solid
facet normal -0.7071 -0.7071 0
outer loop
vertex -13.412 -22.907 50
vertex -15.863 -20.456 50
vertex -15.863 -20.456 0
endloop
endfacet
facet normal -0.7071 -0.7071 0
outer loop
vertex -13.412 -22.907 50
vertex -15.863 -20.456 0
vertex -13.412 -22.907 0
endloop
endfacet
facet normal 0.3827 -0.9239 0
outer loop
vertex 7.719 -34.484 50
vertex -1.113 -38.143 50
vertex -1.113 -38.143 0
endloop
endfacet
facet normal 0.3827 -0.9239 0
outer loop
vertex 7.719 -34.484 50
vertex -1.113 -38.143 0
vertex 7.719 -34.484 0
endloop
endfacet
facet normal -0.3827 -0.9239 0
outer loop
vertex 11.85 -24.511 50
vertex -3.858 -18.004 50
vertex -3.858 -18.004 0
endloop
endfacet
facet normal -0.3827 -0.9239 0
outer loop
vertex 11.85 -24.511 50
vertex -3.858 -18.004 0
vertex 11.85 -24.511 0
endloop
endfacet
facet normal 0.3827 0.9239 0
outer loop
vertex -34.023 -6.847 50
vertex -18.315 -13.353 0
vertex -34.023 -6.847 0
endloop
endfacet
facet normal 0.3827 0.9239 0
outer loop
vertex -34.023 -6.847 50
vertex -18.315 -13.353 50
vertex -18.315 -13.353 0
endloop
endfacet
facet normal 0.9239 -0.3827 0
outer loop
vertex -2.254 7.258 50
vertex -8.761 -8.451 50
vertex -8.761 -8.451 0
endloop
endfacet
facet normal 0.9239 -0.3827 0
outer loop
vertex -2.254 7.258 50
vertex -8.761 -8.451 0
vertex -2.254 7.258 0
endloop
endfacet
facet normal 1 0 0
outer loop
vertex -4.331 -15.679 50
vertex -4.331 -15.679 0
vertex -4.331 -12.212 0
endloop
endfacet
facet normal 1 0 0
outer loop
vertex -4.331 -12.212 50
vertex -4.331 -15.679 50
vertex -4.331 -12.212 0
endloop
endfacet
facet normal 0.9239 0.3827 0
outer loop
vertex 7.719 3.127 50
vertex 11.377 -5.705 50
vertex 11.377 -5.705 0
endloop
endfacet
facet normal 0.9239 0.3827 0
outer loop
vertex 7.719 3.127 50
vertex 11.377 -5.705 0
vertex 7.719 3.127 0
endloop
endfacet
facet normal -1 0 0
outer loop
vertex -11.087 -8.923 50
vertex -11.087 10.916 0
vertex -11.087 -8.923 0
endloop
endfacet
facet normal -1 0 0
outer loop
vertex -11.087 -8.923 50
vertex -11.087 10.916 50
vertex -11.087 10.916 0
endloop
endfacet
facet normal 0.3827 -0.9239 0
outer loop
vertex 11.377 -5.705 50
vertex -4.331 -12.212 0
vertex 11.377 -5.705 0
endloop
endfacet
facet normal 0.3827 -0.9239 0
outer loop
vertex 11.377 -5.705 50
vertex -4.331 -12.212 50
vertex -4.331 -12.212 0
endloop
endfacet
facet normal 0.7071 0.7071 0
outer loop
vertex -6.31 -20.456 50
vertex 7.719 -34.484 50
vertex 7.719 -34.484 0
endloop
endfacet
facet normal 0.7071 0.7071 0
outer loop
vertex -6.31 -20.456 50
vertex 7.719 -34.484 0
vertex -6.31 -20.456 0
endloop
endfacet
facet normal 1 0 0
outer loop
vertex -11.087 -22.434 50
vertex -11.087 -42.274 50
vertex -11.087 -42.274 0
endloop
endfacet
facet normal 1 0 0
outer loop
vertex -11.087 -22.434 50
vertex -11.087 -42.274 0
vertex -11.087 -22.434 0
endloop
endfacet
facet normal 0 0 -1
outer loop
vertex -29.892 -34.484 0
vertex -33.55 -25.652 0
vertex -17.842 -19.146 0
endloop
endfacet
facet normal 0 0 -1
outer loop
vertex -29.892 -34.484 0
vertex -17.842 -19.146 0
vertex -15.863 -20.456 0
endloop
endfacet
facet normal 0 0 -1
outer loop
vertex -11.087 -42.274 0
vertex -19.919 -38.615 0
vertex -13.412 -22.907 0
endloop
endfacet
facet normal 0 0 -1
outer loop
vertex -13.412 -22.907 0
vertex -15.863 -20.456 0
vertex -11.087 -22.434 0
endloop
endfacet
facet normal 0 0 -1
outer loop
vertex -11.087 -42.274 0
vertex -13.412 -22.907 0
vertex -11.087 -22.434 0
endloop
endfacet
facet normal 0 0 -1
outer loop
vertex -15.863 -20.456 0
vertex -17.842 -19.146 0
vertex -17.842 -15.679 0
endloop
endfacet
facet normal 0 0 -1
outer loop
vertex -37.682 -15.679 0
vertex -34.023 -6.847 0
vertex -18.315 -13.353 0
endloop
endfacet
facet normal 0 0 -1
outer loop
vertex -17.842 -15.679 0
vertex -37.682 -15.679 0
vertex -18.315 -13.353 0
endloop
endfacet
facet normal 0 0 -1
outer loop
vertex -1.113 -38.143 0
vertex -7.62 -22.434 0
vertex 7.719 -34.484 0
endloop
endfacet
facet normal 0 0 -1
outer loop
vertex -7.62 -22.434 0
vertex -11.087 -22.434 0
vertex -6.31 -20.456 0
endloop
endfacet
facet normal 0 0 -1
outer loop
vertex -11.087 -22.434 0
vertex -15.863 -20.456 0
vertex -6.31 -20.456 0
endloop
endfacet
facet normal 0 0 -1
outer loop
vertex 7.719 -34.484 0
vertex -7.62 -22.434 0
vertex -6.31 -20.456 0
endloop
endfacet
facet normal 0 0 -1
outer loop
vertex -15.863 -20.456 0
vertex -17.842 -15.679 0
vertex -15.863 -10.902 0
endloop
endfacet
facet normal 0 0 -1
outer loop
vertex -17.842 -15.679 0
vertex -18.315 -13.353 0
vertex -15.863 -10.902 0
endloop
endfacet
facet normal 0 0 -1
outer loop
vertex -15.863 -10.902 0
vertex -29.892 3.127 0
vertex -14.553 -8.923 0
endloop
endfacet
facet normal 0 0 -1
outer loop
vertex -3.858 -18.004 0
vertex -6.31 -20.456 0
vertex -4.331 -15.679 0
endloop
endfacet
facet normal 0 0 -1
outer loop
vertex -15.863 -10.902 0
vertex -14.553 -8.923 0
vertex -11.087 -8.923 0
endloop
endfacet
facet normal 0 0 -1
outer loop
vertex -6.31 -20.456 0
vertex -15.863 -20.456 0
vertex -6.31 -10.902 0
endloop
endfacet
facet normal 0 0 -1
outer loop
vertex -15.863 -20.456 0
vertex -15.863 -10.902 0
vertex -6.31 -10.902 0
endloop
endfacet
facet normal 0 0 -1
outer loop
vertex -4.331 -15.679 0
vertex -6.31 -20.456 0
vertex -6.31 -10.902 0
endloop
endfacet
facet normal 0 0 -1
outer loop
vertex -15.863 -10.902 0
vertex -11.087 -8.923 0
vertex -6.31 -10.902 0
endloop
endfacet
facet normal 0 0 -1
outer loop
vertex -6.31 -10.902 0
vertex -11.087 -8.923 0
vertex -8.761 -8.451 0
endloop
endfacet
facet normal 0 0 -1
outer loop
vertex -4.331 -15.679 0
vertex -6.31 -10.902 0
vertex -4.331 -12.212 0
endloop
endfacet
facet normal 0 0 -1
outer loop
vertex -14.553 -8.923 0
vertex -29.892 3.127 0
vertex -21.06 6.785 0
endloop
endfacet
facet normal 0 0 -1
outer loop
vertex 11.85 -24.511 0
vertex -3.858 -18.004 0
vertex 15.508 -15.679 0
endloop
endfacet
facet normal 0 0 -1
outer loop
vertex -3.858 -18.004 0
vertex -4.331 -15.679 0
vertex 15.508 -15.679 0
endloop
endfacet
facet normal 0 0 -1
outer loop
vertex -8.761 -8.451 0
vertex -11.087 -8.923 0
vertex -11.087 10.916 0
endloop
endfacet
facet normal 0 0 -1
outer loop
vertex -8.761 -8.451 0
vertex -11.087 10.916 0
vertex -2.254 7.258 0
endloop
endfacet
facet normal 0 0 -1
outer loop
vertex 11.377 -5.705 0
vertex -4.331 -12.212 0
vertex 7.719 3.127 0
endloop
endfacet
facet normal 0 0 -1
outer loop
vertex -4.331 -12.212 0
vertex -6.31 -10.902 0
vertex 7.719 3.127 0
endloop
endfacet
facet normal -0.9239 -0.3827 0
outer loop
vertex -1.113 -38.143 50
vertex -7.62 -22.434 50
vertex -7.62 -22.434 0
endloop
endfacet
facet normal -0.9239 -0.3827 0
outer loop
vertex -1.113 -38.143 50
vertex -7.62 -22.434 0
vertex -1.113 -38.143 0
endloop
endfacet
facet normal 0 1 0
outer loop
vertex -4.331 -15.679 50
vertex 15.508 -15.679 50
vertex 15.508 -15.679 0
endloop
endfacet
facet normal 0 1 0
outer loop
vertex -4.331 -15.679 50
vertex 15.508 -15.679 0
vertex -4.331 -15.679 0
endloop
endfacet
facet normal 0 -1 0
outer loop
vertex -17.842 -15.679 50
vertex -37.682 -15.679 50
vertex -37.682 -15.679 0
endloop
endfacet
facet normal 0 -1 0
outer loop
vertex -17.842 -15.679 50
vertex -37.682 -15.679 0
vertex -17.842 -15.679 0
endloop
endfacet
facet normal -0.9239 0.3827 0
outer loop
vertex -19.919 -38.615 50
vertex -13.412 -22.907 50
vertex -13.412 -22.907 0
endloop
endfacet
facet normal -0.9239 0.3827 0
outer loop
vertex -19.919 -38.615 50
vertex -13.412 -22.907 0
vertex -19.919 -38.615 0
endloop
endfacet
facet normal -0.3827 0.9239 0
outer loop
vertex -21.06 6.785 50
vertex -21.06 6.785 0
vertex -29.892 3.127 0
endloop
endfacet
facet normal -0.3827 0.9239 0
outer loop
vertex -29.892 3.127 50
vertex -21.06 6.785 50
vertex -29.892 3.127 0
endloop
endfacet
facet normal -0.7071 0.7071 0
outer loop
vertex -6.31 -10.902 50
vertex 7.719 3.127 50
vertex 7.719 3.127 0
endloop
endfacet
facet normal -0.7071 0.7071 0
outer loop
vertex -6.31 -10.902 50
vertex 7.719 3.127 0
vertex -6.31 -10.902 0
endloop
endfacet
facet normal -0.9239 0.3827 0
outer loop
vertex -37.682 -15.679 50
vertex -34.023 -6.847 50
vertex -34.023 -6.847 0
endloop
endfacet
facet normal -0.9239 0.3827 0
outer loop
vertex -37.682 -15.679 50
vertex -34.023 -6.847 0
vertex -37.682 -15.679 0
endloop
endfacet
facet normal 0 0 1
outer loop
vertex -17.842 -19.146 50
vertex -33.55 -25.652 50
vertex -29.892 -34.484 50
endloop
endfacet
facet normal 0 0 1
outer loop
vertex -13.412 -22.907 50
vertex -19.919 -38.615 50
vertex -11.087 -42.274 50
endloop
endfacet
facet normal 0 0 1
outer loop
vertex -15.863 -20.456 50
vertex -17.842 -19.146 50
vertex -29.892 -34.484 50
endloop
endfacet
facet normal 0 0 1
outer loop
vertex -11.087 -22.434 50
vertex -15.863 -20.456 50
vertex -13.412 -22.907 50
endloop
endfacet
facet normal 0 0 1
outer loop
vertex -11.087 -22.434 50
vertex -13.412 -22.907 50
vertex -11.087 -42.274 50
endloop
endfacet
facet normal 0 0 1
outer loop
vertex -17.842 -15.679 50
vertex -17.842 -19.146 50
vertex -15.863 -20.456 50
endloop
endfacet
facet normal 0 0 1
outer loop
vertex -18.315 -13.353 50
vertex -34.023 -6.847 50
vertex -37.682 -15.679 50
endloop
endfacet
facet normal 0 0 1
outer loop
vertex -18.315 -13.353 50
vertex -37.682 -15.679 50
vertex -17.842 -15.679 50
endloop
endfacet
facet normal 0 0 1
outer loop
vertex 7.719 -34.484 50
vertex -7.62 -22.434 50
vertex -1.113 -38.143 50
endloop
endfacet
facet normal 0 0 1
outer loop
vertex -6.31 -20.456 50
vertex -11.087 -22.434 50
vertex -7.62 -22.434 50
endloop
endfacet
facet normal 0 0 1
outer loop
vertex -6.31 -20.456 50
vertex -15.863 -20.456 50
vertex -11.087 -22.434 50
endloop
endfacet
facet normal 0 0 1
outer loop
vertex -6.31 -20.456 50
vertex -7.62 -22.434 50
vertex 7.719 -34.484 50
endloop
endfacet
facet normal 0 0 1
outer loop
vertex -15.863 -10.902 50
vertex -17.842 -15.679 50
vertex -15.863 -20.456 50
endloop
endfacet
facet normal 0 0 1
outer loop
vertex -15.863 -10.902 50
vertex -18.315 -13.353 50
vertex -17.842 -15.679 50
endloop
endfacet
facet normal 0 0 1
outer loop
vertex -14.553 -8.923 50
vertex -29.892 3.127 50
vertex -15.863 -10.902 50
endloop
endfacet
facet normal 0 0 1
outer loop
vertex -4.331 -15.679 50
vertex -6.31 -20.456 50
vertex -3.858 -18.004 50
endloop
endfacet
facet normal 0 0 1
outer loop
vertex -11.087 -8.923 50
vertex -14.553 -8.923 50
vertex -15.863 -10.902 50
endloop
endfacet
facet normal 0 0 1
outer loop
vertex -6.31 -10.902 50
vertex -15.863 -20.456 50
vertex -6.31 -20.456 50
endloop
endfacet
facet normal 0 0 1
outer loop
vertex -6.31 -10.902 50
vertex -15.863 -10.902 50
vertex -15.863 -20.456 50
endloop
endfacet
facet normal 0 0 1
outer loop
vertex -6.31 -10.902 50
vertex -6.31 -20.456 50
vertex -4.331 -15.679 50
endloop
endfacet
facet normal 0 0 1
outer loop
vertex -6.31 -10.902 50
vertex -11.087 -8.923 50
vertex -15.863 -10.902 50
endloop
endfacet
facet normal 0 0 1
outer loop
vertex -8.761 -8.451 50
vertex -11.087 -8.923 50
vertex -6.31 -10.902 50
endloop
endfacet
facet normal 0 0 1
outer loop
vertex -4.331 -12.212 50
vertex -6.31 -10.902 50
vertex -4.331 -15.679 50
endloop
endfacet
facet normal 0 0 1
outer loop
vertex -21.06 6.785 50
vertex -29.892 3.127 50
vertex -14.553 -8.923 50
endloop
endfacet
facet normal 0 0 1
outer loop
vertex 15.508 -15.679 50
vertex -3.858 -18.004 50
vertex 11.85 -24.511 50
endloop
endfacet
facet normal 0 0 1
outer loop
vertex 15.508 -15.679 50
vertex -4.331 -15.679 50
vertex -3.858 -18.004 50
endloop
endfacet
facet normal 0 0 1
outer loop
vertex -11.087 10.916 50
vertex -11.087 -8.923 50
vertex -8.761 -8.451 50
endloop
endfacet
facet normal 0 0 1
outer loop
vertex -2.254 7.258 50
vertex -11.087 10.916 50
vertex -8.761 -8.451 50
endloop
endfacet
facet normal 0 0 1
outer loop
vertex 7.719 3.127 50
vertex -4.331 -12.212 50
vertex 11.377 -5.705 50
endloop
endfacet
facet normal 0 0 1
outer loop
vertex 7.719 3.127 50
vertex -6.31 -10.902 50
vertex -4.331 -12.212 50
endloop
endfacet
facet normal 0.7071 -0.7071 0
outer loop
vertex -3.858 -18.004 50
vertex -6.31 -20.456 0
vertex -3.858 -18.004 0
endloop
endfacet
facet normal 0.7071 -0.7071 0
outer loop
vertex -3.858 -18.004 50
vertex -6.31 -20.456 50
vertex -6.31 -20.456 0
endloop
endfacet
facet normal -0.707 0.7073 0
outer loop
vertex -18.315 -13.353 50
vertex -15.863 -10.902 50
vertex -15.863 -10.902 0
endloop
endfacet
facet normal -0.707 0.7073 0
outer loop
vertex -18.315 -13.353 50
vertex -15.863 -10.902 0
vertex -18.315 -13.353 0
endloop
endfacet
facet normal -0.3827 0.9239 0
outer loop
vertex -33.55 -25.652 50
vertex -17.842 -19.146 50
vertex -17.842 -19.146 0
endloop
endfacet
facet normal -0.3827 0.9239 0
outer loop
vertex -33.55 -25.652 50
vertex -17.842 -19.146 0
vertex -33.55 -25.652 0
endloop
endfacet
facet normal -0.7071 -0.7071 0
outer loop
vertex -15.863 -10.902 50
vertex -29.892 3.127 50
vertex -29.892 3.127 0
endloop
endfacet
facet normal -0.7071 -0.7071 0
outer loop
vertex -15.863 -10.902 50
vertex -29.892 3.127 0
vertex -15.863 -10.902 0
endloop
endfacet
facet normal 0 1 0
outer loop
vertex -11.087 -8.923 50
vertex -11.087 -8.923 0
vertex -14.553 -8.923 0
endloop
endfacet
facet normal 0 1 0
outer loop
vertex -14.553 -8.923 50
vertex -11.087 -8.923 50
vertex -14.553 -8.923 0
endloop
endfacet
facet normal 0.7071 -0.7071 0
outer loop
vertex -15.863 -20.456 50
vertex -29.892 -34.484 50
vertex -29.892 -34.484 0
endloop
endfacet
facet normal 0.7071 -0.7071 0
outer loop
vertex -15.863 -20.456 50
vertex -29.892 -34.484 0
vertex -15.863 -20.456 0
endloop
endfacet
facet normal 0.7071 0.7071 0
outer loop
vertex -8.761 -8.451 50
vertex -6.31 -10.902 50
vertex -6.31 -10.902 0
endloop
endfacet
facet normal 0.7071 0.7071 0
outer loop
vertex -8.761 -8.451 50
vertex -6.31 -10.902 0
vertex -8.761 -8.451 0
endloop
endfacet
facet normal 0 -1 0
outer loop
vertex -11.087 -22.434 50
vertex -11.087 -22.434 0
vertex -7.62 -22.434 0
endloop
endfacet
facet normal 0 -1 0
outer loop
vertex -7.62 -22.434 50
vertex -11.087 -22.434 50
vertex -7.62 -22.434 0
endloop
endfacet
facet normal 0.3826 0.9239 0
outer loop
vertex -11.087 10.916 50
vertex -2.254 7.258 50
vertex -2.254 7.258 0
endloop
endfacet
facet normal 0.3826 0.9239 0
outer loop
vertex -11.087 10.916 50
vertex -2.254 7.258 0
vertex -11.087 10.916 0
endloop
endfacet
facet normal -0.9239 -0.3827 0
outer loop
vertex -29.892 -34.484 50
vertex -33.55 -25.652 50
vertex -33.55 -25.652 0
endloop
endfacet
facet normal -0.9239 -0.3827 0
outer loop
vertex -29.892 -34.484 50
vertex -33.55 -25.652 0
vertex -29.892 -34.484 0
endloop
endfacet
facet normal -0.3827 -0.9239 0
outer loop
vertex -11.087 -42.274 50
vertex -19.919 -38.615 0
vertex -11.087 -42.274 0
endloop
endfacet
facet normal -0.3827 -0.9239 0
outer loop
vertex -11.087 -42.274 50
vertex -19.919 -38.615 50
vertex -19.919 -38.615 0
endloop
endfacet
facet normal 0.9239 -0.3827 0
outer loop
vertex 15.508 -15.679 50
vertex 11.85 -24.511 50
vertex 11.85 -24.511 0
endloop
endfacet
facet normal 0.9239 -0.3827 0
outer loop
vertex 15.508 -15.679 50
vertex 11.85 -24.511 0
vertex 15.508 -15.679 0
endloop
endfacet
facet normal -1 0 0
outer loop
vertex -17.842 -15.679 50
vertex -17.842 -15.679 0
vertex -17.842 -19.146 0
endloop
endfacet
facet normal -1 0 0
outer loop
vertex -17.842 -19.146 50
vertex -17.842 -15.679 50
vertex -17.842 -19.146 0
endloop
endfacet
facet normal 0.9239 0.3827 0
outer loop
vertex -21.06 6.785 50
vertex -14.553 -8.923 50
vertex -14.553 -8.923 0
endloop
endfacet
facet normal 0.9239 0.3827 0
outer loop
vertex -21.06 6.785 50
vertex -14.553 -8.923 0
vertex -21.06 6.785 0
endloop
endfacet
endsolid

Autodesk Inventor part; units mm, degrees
ref_plane "YZ Plane" through (0, 0, 0) normal (1, 0, 0) x (0, 1, 0)
ref_plane "XZ Plane" through (0, 0, 0) normal (0, 1, 0) x (-1, 0, 0)
ref_plane "XY Plane" through (0, 0, 0) normal (0, 0, 1) x (1, 0, 0)
ref_plane "Płaszczyzna konstrukcyjna1" through (0, 0, 0) normal (0, 0, 1) x (1, 0, 0)
sketch "Szkic1" plane through (0, 0, 0) normal (0, 0, 1) x (1, 0, 0)
  line L0 (8.0251, 3.4329) -> (-11.0866, 11.3492) projected
  line L1 (-11.0866, 11.3492) -> (-30.1982, 3.4329) projected
  line L2 (-30.1982, 3.4329) -> (-38.1145, -15.6788) projected
  line L3 (-38.1145, -15.6788) -> (-30.1982, -34.7904) projected
  line L4 (-30.1982, -34.7904) -> (-11.0866, -42.7067) projected
  line L5 (-11.0866, -42.7067) -> (8.0251, -34.7904) projected
  line L6 (8.0251, -34.7904) -> (15.9414, -15.6788) projected
  line L7 (15.9414, -15.6788) -> (8.0251, 3.4329) projected
  point P0 (0, 0)
extrude "Wyciągnięcie proste1" add sketch "Szkic1" along normal blind 50
sketch "Szkic2" plane through (0, 0, 50) normal (0, 0, 1) x (1, 0, 0)
  line L0 (-35.3977, -2.8484) -> (-36.8759, -2.2361) projected
  line L1 (-31.4727, 0.356) -> (-35.1682, 1.8867) projected
  line L2 (8.0251, 3.4329) -> (-11.0866, 11.3492) construction
  line L3 (8.0251, 3.4329) -> (-30.1982, -34.7904) construction
  line L4 (-11.0866, 11.3492) -> (-30.1982, 3.4329) construction
  line L5 (-11.0866, -42.7067) -> (8.0251, -34.7904) construction
  line L6 (-30.1982, 3.4329) -> (8.0251, -34.7904) construction
  line L7 (-30.1982, 3.4329) -> (-38.1145, -15.6788) projected
  line L8 (-30.1982, 3.4329) -> (-15.8633, -10.902)
  line L9 (-15.8633, -10.902) -> (-18.3147, -13.3534)
  line L10 (-18.3147, -13.3534) -> (-34.3927, -6.6936)
  line L11 (-30.1982, 3.4329) -> (-34.3927, -6.6936)
  line L12 (-38.1145, -15.6788) -> (-30.1982, -34.7904) projected
  line L13 (-34.0232, -6.8467) -> (-37.6815, -15.6788)
  line L14 (-38.1145, -15.6788) -> (-11.0866, -15.6788)
  point P0 (0, 0)
  dimension "d7" = 0.4
extrude "Wyciągnięcie proste2" cut sketch "Szkic2" against normal through all
sketch "Szkic3" plane through (0, 0, 50) normal (0, 0, 1) x (1, 0, 0)
  line L0 (8.0251, 3.4329) -> (-11.0866, 11.3492) construction
  line L1 (-30.1982, -34.7904) -> (-11.0866, -42.7067) construction
  line L2 (8.0251, 3.4329) -> (-30.1982, -34.7904) construction
  line L3 (8.0251, -34.7904) -> (-30.1982, 3.4329) construction
  point P0 (0, 0)
  point P1 (-11.0866, -15.6788)
pattern_circular "Szyk kołowy1" count 8 over 360 about axis through (-11.0866, -15.6788, 50) along (0, 0, 1) of "Wyciągnięcie proste2"
properties part number "dopychacz"
